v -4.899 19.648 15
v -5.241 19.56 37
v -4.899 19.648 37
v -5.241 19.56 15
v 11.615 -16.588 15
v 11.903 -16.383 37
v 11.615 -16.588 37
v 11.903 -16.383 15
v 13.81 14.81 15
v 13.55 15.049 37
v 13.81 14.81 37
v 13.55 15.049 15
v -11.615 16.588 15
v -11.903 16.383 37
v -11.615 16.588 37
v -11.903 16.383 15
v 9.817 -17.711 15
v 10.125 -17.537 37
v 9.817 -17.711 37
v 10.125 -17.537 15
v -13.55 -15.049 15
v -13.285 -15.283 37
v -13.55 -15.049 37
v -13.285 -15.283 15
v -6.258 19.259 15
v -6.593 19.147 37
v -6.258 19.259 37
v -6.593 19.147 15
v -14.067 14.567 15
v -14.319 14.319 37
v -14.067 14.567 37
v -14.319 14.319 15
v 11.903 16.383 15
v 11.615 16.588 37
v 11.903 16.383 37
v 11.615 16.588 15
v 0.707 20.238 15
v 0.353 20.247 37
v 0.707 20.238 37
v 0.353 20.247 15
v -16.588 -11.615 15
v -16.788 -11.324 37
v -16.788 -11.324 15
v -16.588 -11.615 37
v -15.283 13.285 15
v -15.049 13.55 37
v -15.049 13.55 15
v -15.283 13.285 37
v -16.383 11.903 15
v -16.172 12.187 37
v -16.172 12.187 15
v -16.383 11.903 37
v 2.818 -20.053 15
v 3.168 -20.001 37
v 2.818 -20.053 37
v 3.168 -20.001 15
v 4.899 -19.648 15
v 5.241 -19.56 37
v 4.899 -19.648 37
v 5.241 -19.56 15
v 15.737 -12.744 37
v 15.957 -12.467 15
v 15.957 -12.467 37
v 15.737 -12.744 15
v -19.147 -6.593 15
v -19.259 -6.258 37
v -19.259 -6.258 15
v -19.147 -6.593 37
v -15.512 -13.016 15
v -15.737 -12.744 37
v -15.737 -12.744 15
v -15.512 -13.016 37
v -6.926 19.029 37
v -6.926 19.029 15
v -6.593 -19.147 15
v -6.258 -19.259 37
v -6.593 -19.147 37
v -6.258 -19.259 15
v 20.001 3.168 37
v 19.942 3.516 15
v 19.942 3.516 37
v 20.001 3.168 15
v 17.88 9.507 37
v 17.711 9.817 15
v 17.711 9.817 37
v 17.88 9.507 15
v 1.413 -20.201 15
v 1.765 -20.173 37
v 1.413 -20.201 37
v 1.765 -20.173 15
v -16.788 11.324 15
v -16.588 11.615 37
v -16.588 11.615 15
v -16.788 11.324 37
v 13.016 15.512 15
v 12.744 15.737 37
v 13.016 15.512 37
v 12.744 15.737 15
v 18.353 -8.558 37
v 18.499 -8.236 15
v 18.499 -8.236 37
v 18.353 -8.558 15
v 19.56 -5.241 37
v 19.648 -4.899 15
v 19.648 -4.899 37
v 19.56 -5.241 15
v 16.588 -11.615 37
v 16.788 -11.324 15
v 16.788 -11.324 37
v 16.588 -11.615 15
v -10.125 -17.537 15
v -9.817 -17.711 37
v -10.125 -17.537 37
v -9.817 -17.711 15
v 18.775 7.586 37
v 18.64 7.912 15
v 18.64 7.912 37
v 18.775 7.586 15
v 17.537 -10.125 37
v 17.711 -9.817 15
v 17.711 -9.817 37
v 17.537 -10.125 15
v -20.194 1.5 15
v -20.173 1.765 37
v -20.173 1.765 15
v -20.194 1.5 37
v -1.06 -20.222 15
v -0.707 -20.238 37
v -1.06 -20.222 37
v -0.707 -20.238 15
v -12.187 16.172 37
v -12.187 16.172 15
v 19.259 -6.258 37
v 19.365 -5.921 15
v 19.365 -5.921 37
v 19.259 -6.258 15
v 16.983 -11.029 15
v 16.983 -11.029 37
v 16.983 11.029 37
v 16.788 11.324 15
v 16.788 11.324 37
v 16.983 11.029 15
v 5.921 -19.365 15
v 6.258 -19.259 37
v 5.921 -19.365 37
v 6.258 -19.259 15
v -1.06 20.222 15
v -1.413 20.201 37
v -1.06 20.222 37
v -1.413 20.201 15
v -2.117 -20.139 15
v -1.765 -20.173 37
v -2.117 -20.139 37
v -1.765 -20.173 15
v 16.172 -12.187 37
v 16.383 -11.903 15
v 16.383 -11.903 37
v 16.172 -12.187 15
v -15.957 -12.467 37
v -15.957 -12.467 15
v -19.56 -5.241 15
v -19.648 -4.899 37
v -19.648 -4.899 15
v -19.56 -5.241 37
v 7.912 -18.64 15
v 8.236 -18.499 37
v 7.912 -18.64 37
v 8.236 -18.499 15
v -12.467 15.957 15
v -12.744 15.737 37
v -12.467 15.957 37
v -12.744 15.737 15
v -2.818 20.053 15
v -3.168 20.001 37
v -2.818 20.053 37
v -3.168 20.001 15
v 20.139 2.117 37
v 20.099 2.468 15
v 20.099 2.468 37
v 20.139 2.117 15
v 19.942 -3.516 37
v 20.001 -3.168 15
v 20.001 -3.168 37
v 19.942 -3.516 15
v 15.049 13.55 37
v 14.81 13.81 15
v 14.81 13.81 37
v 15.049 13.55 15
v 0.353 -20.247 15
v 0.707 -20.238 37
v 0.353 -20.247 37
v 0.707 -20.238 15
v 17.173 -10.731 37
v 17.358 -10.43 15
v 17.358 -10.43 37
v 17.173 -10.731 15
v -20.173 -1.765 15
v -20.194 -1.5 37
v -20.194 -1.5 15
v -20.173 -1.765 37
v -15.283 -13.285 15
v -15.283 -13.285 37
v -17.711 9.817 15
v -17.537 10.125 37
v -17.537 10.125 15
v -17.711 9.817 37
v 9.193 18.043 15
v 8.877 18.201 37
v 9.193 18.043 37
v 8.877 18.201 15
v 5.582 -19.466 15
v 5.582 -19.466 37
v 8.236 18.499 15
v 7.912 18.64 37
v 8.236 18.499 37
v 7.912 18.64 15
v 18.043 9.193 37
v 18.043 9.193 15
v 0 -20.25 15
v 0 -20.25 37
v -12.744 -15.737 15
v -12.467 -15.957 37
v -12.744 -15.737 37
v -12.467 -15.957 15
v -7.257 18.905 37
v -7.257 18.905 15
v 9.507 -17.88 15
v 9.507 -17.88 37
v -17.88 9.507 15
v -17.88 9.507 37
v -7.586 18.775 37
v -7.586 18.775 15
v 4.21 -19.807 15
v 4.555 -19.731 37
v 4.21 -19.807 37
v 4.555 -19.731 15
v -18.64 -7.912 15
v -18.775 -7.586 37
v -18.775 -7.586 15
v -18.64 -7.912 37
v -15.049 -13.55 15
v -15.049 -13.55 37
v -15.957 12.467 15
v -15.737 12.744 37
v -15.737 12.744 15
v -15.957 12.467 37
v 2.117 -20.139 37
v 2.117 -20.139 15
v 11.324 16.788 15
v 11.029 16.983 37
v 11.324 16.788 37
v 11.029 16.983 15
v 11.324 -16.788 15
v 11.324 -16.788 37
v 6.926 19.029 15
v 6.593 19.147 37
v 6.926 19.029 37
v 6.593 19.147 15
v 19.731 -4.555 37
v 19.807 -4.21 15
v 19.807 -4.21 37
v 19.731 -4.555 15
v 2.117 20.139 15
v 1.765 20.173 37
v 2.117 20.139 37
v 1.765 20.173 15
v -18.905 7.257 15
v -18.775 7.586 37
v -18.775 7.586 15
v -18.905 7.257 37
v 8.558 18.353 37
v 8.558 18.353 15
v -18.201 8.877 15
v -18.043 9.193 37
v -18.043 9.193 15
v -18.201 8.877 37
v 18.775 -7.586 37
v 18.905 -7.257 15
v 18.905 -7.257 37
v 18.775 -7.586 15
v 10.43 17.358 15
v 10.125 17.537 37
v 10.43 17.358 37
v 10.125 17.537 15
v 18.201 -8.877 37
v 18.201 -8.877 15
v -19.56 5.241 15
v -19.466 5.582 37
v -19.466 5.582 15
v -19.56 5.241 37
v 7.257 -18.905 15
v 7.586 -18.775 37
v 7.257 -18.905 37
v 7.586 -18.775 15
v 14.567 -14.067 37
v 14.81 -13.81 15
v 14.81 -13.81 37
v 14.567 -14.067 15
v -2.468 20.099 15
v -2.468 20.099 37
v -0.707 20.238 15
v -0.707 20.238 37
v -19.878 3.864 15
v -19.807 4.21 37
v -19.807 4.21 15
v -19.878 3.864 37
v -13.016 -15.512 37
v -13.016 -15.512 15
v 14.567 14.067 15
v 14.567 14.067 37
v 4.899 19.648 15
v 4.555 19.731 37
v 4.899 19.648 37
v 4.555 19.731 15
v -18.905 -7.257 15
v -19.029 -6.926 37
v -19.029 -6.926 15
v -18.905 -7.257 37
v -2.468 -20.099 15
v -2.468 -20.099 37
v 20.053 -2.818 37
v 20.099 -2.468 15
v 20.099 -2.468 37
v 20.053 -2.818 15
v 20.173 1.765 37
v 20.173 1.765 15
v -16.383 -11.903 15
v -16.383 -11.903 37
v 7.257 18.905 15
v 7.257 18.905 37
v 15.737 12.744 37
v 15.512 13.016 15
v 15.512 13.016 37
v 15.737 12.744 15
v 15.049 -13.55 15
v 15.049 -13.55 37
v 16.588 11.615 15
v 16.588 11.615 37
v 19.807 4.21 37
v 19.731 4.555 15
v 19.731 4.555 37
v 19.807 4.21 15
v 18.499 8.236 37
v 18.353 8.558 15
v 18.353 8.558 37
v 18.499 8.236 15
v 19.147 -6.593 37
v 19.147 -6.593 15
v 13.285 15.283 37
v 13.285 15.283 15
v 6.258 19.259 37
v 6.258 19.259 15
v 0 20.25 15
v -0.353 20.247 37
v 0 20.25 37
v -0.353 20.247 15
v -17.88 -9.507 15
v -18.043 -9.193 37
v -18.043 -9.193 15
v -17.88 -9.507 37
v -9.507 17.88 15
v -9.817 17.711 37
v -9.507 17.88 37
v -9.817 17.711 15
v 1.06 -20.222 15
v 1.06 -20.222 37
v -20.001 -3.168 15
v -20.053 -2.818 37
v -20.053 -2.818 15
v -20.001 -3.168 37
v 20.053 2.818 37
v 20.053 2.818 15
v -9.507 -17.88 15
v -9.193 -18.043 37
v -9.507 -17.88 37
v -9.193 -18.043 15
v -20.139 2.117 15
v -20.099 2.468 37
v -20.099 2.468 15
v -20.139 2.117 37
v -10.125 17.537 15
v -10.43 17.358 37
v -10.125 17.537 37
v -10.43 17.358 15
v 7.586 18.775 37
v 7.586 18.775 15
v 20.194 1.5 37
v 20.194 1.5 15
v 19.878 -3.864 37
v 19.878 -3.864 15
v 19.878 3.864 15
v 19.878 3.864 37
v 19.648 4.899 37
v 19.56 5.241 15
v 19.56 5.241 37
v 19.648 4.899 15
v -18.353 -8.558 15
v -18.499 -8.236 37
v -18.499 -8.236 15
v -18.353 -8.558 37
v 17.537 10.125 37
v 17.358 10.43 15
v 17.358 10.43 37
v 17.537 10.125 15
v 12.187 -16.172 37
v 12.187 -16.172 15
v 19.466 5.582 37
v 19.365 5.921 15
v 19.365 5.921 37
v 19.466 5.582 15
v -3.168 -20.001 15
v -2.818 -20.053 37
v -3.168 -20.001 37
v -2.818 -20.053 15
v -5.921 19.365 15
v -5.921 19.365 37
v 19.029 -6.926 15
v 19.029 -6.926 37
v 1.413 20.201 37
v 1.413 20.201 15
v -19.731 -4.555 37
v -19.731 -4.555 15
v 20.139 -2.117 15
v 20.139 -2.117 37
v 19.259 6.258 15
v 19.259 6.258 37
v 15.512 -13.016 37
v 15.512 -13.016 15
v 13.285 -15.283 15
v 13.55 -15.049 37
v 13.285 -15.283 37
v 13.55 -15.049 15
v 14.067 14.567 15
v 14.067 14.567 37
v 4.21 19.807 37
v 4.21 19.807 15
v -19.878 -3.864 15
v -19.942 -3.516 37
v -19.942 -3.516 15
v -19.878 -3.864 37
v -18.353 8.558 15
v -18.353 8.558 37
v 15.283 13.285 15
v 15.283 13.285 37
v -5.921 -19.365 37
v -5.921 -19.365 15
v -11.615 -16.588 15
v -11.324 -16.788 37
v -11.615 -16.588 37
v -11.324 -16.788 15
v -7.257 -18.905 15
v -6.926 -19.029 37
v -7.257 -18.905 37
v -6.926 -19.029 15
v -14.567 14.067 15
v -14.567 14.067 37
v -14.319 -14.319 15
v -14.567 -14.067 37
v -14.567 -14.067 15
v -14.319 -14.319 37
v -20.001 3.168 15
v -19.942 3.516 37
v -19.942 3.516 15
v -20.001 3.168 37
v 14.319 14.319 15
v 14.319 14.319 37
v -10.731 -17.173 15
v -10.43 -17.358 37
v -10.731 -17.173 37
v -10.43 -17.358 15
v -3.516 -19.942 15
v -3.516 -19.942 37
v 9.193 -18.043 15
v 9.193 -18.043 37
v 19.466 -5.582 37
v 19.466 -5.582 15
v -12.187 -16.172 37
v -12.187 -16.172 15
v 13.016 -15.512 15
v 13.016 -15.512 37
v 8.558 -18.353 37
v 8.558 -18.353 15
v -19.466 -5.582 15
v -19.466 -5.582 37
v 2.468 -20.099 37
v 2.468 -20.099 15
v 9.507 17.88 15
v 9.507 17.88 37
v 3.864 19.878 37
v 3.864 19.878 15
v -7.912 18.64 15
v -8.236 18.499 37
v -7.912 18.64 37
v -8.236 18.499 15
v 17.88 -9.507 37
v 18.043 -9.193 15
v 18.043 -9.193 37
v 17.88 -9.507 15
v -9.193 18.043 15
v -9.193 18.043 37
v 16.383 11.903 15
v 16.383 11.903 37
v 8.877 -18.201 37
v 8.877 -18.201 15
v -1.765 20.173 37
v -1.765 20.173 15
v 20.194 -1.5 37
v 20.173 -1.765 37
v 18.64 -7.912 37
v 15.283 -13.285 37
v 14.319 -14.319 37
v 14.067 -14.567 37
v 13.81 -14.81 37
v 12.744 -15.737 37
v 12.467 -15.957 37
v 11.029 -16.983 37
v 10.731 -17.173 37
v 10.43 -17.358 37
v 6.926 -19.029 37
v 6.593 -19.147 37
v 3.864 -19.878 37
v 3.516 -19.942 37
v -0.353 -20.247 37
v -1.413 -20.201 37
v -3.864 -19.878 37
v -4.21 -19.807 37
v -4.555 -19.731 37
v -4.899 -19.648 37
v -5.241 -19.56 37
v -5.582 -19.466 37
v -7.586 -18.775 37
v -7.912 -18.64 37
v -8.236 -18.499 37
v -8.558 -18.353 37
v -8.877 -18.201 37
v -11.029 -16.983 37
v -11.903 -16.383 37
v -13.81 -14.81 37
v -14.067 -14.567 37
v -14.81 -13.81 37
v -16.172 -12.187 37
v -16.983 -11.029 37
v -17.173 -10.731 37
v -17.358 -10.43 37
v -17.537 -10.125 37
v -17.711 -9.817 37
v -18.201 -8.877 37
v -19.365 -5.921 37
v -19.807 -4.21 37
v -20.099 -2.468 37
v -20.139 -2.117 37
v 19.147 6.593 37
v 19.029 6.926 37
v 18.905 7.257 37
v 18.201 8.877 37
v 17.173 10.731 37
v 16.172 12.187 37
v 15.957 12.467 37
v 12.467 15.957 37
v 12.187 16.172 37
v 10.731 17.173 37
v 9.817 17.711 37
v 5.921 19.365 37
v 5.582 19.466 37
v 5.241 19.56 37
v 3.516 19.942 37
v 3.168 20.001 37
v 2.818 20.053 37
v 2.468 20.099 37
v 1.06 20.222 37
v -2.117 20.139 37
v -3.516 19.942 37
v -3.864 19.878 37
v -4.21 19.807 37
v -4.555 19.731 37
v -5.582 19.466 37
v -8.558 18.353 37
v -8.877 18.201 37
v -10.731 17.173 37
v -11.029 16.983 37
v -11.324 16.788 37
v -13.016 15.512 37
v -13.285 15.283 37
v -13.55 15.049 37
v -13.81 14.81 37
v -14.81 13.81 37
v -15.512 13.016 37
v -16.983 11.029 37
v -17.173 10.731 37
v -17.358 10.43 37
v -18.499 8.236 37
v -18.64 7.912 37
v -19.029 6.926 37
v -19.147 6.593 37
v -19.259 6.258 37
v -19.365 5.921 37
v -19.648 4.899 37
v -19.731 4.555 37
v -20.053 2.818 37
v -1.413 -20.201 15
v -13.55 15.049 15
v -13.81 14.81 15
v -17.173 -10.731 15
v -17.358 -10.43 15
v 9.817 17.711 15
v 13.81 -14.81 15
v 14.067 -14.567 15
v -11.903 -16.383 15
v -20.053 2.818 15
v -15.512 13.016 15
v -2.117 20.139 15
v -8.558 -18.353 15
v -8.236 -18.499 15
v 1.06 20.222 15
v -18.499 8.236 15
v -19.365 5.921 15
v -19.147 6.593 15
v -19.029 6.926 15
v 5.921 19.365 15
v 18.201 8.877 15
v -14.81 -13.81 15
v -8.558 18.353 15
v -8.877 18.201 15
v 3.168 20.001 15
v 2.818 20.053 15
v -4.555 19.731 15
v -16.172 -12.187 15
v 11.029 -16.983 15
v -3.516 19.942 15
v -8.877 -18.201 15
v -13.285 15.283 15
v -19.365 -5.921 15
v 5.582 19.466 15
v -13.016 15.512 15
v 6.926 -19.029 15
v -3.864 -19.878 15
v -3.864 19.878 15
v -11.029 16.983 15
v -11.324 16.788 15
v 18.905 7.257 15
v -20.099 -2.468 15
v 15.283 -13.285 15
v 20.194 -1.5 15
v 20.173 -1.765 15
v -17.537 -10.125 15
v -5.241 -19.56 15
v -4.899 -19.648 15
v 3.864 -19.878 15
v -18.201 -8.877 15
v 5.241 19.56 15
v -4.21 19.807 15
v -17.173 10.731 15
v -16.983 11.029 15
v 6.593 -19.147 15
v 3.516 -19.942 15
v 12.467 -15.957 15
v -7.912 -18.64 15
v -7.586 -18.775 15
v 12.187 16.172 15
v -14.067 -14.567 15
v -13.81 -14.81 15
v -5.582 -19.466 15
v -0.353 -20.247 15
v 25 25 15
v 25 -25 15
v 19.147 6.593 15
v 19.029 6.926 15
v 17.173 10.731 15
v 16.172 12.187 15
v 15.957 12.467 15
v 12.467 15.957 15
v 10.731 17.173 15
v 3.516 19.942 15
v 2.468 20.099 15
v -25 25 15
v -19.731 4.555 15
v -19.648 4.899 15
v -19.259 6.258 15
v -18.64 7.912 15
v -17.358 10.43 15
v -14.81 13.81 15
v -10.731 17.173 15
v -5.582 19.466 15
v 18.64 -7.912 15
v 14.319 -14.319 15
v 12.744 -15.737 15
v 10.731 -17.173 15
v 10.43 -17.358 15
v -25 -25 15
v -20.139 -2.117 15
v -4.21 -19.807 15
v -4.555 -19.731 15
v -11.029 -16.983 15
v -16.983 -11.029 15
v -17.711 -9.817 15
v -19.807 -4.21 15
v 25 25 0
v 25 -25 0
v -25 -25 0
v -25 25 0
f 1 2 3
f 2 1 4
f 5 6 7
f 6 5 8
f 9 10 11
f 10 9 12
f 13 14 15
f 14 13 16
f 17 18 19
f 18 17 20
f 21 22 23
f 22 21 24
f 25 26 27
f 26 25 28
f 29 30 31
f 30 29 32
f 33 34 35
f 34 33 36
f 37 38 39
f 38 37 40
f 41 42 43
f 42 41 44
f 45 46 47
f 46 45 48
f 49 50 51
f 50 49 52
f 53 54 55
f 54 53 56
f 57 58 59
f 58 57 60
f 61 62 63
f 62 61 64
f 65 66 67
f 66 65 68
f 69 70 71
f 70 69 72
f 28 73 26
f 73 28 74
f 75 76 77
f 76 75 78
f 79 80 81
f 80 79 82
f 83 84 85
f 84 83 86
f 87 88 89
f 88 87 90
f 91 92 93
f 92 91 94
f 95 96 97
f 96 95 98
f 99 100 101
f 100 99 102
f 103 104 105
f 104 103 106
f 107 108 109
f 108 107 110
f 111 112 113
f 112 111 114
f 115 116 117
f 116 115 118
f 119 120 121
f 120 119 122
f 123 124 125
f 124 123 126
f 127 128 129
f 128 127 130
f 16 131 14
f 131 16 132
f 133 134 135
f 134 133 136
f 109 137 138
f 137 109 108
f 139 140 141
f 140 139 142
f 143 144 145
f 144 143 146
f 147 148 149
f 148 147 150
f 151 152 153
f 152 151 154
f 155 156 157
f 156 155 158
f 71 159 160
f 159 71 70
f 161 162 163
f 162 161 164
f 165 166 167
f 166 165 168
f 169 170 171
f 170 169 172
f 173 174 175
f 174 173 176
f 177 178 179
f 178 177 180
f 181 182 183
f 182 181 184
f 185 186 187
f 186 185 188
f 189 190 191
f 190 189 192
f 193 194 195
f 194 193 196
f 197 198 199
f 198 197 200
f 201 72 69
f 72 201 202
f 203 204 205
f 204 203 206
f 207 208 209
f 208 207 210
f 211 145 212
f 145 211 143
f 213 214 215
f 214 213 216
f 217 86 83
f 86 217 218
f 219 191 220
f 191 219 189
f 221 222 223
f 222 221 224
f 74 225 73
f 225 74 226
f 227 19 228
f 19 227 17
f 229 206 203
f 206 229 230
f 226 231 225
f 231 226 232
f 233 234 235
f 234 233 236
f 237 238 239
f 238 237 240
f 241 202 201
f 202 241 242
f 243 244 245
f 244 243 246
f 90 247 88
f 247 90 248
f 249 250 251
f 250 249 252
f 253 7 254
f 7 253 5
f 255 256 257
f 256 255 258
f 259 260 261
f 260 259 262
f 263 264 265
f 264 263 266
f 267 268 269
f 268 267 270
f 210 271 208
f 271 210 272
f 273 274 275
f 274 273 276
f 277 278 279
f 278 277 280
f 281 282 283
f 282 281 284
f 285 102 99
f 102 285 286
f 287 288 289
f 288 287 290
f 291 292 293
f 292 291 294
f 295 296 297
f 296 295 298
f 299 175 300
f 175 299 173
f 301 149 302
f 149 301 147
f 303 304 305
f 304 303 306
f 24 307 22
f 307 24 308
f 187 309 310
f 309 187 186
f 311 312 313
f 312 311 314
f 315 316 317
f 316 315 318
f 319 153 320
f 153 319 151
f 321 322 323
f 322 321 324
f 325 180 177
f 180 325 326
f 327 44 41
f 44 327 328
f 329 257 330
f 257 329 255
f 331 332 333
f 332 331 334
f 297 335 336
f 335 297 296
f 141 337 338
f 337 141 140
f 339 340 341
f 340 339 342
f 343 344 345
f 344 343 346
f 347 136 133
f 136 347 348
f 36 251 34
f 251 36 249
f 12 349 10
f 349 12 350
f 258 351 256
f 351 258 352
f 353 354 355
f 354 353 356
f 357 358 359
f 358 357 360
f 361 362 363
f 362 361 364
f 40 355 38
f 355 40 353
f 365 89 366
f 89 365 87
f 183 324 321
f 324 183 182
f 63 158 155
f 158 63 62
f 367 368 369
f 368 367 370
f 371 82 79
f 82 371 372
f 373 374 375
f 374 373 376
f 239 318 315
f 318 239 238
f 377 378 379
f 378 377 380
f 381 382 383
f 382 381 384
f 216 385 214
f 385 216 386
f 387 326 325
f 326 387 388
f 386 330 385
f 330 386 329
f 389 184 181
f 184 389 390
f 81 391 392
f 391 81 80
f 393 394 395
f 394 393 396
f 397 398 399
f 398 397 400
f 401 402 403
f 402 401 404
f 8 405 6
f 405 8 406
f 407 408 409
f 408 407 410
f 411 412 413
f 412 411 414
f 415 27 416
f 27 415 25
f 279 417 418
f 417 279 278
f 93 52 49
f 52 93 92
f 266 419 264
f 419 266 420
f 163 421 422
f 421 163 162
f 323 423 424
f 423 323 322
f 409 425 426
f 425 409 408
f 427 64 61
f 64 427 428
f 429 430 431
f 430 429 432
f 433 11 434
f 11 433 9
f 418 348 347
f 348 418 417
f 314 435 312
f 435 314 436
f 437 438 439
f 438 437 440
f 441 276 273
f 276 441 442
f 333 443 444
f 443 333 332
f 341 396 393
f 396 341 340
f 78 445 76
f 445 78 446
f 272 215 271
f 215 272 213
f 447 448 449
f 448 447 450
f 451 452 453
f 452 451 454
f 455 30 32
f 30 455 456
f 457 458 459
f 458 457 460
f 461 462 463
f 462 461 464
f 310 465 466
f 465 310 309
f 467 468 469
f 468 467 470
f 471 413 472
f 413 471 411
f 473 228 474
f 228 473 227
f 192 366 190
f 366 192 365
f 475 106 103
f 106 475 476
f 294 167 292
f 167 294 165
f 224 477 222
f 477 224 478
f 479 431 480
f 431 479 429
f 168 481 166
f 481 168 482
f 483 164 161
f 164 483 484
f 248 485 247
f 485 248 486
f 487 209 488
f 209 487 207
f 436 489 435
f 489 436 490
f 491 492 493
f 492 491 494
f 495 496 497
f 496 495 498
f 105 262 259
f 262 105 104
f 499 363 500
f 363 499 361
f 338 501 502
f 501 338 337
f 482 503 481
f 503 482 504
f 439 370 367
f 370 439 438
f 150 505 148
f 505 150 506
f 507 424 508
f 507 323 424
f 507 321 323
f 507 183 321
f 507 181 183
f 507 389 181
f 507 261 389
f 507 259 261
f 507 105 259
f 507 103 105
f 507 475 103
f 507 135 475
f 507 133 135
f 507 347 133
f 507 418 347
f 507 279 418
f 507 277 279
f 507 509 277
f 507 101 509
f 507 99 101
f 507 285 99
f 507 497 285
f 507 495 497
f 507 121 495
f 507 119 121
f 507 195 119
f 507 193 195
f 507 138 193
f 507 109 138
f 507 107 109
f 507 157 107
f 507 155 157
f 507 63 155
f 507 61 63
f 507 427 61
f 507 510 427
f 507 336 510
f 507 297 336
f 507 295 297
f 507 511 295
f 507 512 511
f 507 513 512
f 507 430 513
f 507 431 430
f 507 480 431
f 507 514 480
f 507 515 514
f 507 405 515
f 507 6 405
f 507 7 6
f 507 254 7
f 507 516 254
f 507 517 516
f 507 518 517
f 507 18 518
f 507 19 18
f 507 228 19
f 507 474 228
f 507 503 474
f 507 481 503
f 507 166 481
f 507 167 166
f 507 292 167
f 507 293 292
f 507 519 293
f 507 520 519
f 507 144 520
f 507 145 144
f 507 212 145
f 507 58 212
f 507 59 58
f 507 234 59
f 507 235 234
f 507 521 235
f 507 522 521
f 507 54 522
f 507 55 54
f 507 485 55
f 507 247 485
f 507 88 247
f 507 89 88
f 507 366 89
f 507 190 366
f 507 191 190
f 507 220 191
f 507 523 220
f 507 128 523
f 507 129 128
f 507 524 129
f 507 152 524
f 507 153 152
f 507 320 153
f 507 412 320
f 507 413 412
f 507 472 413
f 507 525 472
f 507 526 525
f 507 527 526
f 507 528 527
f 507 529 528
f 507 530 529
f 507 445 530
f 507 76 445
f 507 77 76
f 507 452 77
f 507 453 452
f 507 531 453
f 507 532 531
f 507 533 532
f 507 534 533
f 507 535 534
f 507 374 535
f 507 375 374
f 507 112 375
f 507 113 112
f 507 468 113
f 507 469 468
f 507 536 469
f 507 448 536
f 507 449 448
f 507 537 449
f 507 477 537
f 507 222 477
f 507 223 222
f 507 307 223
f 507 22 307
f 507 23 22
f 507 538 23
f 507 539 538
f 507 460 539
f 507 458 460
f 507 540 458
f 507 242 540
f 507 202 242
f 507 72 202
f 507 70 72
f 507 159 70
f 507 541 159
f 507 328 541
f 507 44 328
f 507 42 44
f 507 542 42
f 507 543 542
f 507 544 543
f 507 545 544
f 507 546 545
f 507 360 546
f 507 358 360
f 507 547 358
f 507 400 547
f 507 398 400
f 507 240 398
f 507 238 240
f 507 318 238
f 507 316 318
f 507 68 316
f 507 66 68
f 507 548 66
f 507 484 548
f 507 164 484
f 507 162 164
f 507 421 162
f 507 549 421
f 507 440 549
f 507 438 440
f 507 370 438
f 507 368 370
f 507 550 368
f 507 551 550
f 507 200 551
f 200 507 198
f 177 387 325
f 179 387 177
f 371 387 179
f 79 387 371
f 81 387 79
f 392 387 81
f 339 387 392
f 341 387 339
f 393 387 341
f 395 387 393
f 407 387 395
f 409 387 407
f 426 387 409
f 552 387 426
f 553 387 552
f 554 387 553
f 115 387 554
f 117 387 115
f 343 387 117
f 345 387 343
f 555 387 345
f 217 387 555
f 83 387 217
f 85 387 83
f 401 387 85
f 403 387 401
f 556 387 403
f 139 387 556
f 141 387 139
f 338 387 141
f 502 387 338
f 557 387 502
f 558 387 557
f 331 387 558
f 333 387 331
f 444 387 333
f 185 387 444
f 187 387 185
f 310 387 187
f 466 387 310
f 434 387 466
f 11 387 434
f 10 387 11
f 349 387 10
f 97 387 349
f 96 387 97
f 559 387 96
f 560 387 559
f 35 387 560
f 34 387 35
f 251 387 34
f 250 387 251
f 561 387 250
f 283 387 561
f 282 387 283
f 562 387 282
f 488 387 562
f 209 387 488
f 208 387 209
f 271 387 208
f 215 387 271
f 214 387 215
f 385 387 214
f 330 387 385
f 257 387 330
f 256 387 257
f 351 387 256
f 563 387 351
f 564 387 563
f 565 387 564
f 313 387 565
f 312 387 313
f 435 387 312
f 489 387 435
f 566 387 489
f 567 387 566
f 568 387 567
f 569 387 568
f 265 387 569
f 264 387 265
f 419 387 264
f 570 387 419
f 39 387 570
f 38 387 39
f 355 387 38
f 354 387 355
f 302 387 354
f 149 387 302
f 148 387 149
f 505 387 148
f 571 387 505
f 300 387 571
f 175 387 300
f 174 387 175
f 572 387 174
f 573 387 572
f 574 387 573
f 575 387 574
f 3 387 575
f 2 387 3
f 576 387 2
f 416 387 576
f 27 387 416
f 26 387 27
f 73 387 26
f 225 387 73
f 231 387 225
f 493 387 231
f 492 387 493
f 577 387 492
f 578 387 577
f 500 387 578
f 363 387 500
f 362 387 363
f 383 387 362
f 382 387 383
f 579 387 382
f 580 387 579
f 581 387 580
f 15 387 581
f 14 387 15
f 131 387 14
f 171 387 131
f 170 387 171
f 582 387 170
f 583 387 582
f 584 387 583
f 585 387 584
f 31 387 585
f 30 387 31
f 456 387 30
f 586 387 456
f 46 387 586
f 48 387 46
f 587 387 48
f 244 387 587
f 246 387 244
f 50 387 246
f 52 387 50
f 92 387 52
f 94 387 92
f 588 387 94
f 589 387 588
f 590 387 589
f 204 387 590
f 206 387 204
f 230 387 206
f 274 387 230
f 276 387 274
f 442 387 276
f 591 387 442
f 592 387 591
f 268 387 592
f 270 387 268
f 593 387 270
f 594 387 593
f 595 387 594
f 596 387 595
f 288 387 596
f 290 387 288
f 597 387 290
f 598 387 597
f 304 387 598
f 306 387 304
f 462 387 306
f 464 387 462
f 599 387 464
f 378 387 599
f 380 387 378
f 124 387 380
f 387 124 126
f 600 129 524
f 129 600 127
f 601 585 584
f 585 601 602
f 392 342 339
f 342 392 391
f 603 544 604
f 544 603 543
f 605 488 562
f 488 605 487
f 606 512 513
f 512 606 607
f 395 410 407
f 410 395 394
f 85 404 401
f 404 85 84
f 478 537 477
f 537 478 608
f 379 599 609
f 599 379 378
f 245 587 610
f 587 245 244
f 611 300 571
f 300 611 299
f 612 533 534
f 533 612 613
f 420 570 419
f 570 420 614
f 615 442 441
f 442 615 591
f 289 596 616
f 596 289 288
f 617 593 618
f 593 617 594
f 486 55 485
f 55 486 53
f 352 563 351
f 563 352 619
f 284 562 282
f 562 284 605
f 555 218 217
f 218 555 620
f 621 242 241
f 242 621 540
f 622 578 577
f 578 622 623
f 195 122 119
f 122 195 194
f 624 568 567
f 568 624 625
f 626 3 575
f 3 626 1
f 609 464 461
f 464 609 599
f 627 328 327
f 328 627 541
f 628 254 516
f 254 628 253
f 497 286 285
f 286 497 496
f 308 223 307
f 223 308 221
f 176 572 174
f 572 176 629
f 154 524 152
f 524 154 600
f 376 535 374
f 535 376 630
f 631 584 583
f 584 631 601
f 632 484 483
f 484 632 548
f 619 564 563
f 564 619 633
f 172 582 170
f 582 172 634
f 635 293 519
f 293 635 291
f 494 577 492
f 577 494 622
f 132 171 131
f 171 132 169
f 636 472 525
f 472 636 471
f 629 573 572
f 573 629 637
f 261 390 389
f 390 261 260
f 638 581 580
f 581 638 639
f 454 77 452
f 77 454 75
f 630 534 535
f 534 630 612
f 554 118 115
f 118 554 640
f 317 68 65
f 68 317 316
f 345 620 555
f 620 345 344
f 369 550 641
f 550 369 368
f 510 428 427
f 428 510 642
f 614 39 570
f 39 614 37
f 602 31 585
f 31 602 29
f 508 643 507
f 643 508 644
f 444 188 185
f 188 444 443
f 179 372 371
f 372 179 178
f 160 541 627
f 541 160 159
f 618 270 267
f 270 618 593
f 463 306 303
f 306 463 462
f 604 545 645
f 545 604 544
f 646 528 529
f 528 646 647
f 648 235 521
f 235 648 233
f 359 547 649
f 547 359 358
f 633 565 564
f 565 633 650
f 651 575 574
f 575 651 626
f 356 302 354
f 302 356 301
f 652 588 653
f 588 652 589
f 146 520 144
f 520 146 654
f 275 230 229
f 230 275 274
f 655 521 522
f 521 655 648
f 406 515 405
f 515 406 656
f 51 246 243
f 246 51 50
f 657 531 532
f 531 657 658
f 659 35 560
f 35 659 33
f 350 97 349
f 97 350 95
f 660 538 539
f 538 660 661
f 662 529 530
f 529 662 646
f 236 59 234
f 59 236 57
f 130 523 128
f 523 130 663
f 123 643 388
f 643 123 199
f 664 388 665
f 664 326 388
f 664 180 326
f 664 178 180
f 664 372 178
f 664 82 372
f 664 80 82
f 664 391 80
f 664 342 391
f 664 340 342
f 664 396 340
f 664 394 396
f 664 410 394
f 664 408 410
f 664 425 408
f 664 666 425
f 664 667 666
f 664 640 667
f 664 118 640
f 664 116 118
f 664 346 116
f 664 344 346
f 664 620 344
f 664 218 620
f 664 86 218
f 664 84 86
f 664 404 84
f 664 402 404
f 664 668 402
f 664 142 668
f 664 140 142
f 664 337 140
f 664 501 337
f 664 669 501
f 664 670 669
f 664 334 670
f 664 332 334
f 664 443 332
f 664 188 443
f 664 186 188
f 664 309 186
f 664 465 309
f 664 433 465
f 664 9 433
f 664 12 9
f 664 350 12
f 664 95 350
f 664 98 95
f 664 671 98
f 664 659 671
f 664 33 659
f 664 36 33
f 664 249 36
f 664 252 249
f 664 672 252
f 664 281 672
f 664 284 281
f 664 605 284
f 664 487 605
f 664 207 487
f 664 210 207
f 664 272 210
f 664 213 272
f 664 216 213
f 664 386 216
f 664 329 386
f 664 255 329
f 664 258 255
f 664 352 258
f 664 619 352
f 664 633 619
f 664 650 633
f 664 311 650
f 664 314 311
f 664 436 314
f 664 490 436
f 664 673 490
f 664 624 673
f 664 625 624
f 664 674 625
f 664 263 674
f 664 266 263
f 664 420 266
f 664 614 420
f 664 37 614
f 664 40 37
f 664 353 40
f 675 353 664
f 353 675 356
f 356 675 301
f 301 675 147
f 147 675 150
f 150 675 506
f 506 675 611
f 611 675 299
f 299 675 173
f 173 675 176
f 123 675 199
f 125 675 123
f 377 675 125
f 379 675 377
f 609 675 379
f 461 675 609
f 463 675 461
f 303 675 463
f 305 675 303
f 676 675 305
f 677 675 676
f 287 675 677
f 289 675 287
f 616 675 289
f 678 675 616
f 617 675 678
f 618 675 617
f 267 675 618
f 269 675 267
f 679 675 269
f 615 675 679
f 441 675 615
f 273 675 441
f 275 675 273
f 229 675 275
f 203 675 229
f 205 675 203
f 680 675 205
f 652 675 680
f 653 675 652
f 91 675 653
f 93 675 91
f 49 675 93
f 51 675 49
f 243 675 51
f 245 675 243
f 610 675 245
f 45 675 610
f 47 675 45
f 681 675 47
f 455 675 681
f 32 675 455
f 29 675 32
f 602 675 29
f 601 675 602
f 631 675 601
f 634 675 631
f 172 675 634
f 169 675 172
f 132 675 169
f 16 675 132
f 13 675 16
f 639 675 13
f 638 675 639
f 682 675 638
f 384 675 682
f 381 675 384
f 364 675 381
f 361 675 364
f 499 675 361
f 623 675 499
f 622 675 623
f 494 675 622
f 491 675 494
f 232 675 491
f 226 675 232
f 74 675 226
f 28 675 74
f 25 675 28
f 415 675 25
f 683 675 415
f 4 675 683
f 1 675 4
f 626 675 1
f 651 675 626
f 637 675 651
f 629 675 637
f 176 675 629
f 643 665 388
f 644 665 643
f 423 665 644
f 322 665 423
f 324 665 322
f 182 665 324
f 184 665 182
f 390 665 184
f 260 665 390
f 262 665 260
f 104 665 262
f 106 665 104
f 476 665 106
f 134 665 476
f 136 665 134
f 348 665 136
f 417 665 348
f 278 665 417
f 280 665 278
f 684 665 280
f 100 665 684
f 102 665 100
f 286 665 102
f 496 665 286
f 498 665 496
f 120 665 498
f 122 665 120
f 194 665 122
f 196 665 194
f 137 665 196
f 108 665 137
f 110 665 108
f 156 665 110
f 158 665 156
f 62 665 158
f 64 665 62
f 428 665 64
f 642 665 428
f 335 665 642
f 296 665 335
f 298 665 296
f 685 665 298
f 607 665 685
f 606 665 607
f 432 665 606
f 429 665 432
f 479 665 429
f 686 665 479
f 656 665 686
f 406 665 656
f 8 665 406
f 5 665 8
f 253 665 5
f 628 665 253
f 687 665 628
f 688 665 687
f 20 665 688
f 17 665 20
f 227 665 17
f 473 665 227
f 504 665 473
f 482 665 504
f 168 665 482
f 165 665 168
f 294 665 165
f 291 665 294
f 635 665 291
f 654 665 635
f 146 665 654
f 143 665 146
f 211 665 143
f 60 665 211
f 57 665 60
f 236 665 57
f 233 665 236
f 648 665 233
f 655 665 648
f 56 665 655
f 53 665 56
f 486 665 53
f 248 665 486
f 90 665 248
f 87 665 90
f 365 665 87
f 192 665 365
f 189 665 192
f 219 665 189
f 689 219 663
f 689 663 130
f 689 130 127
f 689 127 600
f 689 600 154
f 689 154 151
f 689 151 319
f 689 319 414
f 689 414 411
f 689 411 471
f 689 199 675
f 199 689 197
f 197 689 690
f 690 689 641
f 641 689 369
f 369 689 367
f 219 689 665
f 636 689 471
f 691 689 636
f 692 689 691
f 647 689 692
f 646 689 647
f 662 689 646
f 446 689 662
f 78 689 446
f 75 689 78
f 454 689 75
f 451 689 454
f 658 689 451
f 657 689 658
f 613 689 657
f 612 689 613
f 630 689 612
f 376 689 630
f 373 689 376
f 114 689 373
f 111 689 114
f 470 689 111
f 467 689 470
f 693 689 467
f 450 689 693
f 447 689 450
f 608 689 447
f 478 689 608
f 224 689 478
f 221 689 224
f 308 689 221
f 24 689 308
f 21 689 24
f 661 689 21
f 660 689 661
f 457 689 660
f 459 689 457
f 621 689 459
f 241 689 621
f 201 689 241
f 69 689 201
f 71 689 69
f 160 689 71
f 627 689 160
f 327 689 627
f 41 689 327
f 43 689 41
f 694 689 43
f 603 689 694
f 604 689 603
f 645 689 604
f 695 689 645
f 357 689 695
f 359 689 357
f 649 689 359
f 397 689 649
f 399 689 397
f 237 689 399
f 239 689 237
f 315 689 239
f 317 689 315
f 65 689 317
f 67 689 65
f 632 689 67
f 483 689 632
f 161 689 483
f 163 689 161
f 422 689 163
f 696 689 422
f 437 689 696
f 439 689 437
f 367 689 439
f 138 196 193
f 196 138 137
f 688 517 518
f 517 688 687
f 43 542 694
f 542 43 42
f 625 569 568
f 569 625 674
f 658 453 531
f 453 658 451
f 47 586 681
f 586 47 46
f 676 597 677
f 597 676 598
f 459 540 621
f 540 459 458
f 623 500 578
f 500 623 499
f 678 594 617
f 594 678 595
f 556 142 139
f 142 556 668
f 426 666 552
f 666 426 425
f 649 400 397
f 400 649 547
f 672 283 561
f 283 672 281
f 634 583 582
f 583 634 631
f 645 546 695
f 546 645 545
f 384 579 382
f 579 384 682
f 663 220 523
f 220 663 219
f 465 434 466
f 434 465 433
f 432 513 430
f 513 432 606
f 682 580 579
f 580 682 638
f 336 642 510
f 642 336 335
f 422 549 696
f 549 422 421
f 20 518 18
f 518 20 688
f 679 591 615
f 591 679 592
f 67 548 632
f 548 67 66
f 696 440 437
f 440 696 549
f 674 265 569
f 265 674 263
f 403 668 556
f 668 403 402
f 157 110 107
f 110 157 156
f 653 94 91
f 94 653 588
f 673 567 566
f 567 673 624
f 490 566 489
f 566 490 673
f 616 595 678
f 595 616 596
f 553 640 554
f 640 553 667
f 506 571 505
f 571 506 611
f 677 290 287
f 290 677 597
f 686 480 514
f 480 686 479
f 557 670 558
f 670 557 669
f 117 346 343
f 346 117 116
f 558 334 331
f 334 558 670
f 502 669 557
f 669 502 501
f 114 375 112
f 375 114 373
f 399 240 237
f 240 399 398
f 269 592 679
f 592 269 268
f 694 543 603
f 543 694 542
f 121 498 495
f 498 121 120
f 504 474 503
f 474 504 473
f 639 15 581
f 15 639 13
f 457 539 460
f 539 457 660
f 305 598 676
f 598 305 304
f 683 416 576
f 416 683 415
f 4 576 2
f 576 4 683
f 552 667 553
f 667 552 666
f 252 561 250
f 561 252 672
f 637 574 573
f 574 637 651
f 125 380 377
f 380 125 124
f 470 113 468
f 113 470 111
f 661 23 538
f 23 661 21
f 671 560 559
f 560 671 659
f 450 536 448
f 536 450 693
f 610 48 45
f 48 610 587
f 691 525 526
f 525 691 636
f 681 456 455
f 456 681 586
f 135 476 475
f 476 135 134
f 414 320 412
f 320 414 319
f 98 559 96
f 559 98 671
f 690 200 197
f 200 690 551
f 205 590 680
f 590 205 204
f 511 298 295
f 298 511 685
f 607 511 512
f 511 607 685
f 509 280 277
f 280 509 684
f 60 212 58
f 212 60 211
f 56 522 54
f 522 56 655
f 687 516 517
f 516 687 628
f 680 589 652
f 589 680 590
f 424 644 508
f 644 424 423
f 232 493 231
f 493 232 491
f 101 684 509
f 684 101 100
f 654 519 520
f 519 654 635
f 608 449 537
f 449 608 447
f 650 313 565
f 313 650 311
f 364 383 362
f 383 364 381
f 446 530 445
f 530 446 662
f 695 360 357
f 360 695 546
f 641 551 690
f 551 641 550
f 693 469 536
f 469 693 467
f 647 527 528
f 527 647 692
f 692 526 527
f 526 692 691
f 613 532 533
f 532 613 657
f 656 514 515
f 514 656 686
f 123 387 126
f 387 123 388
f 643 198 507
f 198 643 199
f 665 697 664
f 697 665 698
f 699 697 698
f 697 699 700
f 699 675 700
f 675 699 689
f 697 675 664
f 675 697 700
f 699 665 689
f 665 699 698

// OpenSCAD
// DogHolePeg

$fa=1*1;
$fs=0.25*1;

// select type of head: rectangular or round
head_type = "rect"; // [rect, round] 
// Inch input values are internally converted to mm. Export should then be done in mm.
metric = "mm"; // [mm, inch]

/* [main] */ 

// height of head/head part
head_height = 15;
// head size x (rect head) or diameter (round head)
head_size_x = 50;
// head size y (rect head)
head_size_y = 50;
// diameter of peg hole 
base_diameter = 40.5;
// depth of peg hole, usually thickniss of working table plate
base_height = 22.0;


/* [optional] */

// centered hole for a screw or reenforcements. Set to 0 for none.
drill_hole_diameter = 0;
// head counterbore depth around drilling 
drill_hole_head_counterbore_depth = 5;
// head counterbore diameter 
drill_hole_head_counterbore_diameter = 10;
// base counterbore depth around drilling 
drill_hole_base_counterbore_depth = 5;
// base counterbore diameter 
drill_hole_base_counterbore_diameter = 10;
// add slit in peg base
base_slit_size = 3;



unit_scale = metric == "inch" ? 25.4 : 1.0;
s_head_height = head_height * unit_scale;
s_head_size_x = head_size_x * unit_scale;
s_head_size_y = head_size_y * unit_scale;
s_base_diameter = base_diameter * unit_scale;
s_base_height = base_height * unit_scale;
s_drill_hole_diameter = drill_hole_diameter * unit_scale;
s_drill_hole_head_counterbore_depth = drill_hole_head_counterbore_depth * unit_scale;
s_drill_hole_head_counterbore_diameter = drill_hole_head_counterbore_diameter * unit_scale;
s_drill_hole_base_counterbore_depth = drill_hole_base_counterbore_depth * unit_scale;
s_drill_hole_base_counterbore_diameter = drill_hole_base_counterbore_diameter * unit_scale;
s_base_slit_size = base_slit_size * unit_scale;
s_head_diameter = s_head_size_x;


difference() {
    union() {
        
        // head / top 
        translate([0,0, s_head_height/2]) {
            if (head_type == "round") {
                cylinder(s_head_height, d=s_head_diameter, center=true);
            } else {
                cube([s_head_size_x, s_head_size_y, s_head_height], center=true);
            }
        }
        
        // base/peg/hole
        translate([0,0, s_head_height]) {
            difference() {
                cylinder(s_base_height, d=s_base_diameter, center=false);
                if (s_base_slit_size > 0) {
                    translate([-s_base_diameter/2,-s_base_slit_size/2,0])
                        cube([s_base_diameter, s_base_slit_size, s_base_height], center=false);
                }
            }
        }
    };
    
    if (s_drill_hole_diameter > 0) {
        cylinder(s_base_height+s_head_height, d=s_drill_hole_diameter, center=false);
        cylinder(s_drill_hole_head_counterbore_depth, d=s_drill_hole_head_counterbore_diameter, center=false);
        translate([0,0,s_head_height+s_base_height-s_drill_hole_head_counterbore_depth]) {
            cylinder(s_drill_hole_base_counterbore_depth, d=s_drill_hole_base_counterbore_diameter, center=false);
        }
    }
    
    
}

echo(version=version());
